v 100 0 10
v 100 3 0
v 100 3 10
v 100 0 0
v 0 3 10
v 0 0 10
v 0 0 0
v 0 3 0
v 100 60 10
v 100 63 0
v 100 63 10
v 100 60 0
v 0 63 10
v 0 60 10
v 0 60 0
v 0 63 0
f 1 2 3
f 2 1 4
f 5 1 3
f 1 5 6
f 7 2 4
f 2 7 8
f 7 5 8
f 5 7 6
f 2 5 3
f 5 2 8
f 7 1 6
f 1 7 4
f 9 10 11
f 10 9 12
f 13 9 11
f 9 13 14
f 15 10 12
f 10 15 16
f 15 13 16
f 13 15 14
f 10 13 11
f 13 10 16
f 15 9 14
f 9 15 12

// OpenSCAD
linear_extrude(height=2)
import("e3k.dxf");
cube([100,3,10]);

translate([100,60,0])
mirror([1,0,0])
linear_extrude(height=2)
import("e3k.dxf");
translate([0,60,0])
cube([100,3,10]);
